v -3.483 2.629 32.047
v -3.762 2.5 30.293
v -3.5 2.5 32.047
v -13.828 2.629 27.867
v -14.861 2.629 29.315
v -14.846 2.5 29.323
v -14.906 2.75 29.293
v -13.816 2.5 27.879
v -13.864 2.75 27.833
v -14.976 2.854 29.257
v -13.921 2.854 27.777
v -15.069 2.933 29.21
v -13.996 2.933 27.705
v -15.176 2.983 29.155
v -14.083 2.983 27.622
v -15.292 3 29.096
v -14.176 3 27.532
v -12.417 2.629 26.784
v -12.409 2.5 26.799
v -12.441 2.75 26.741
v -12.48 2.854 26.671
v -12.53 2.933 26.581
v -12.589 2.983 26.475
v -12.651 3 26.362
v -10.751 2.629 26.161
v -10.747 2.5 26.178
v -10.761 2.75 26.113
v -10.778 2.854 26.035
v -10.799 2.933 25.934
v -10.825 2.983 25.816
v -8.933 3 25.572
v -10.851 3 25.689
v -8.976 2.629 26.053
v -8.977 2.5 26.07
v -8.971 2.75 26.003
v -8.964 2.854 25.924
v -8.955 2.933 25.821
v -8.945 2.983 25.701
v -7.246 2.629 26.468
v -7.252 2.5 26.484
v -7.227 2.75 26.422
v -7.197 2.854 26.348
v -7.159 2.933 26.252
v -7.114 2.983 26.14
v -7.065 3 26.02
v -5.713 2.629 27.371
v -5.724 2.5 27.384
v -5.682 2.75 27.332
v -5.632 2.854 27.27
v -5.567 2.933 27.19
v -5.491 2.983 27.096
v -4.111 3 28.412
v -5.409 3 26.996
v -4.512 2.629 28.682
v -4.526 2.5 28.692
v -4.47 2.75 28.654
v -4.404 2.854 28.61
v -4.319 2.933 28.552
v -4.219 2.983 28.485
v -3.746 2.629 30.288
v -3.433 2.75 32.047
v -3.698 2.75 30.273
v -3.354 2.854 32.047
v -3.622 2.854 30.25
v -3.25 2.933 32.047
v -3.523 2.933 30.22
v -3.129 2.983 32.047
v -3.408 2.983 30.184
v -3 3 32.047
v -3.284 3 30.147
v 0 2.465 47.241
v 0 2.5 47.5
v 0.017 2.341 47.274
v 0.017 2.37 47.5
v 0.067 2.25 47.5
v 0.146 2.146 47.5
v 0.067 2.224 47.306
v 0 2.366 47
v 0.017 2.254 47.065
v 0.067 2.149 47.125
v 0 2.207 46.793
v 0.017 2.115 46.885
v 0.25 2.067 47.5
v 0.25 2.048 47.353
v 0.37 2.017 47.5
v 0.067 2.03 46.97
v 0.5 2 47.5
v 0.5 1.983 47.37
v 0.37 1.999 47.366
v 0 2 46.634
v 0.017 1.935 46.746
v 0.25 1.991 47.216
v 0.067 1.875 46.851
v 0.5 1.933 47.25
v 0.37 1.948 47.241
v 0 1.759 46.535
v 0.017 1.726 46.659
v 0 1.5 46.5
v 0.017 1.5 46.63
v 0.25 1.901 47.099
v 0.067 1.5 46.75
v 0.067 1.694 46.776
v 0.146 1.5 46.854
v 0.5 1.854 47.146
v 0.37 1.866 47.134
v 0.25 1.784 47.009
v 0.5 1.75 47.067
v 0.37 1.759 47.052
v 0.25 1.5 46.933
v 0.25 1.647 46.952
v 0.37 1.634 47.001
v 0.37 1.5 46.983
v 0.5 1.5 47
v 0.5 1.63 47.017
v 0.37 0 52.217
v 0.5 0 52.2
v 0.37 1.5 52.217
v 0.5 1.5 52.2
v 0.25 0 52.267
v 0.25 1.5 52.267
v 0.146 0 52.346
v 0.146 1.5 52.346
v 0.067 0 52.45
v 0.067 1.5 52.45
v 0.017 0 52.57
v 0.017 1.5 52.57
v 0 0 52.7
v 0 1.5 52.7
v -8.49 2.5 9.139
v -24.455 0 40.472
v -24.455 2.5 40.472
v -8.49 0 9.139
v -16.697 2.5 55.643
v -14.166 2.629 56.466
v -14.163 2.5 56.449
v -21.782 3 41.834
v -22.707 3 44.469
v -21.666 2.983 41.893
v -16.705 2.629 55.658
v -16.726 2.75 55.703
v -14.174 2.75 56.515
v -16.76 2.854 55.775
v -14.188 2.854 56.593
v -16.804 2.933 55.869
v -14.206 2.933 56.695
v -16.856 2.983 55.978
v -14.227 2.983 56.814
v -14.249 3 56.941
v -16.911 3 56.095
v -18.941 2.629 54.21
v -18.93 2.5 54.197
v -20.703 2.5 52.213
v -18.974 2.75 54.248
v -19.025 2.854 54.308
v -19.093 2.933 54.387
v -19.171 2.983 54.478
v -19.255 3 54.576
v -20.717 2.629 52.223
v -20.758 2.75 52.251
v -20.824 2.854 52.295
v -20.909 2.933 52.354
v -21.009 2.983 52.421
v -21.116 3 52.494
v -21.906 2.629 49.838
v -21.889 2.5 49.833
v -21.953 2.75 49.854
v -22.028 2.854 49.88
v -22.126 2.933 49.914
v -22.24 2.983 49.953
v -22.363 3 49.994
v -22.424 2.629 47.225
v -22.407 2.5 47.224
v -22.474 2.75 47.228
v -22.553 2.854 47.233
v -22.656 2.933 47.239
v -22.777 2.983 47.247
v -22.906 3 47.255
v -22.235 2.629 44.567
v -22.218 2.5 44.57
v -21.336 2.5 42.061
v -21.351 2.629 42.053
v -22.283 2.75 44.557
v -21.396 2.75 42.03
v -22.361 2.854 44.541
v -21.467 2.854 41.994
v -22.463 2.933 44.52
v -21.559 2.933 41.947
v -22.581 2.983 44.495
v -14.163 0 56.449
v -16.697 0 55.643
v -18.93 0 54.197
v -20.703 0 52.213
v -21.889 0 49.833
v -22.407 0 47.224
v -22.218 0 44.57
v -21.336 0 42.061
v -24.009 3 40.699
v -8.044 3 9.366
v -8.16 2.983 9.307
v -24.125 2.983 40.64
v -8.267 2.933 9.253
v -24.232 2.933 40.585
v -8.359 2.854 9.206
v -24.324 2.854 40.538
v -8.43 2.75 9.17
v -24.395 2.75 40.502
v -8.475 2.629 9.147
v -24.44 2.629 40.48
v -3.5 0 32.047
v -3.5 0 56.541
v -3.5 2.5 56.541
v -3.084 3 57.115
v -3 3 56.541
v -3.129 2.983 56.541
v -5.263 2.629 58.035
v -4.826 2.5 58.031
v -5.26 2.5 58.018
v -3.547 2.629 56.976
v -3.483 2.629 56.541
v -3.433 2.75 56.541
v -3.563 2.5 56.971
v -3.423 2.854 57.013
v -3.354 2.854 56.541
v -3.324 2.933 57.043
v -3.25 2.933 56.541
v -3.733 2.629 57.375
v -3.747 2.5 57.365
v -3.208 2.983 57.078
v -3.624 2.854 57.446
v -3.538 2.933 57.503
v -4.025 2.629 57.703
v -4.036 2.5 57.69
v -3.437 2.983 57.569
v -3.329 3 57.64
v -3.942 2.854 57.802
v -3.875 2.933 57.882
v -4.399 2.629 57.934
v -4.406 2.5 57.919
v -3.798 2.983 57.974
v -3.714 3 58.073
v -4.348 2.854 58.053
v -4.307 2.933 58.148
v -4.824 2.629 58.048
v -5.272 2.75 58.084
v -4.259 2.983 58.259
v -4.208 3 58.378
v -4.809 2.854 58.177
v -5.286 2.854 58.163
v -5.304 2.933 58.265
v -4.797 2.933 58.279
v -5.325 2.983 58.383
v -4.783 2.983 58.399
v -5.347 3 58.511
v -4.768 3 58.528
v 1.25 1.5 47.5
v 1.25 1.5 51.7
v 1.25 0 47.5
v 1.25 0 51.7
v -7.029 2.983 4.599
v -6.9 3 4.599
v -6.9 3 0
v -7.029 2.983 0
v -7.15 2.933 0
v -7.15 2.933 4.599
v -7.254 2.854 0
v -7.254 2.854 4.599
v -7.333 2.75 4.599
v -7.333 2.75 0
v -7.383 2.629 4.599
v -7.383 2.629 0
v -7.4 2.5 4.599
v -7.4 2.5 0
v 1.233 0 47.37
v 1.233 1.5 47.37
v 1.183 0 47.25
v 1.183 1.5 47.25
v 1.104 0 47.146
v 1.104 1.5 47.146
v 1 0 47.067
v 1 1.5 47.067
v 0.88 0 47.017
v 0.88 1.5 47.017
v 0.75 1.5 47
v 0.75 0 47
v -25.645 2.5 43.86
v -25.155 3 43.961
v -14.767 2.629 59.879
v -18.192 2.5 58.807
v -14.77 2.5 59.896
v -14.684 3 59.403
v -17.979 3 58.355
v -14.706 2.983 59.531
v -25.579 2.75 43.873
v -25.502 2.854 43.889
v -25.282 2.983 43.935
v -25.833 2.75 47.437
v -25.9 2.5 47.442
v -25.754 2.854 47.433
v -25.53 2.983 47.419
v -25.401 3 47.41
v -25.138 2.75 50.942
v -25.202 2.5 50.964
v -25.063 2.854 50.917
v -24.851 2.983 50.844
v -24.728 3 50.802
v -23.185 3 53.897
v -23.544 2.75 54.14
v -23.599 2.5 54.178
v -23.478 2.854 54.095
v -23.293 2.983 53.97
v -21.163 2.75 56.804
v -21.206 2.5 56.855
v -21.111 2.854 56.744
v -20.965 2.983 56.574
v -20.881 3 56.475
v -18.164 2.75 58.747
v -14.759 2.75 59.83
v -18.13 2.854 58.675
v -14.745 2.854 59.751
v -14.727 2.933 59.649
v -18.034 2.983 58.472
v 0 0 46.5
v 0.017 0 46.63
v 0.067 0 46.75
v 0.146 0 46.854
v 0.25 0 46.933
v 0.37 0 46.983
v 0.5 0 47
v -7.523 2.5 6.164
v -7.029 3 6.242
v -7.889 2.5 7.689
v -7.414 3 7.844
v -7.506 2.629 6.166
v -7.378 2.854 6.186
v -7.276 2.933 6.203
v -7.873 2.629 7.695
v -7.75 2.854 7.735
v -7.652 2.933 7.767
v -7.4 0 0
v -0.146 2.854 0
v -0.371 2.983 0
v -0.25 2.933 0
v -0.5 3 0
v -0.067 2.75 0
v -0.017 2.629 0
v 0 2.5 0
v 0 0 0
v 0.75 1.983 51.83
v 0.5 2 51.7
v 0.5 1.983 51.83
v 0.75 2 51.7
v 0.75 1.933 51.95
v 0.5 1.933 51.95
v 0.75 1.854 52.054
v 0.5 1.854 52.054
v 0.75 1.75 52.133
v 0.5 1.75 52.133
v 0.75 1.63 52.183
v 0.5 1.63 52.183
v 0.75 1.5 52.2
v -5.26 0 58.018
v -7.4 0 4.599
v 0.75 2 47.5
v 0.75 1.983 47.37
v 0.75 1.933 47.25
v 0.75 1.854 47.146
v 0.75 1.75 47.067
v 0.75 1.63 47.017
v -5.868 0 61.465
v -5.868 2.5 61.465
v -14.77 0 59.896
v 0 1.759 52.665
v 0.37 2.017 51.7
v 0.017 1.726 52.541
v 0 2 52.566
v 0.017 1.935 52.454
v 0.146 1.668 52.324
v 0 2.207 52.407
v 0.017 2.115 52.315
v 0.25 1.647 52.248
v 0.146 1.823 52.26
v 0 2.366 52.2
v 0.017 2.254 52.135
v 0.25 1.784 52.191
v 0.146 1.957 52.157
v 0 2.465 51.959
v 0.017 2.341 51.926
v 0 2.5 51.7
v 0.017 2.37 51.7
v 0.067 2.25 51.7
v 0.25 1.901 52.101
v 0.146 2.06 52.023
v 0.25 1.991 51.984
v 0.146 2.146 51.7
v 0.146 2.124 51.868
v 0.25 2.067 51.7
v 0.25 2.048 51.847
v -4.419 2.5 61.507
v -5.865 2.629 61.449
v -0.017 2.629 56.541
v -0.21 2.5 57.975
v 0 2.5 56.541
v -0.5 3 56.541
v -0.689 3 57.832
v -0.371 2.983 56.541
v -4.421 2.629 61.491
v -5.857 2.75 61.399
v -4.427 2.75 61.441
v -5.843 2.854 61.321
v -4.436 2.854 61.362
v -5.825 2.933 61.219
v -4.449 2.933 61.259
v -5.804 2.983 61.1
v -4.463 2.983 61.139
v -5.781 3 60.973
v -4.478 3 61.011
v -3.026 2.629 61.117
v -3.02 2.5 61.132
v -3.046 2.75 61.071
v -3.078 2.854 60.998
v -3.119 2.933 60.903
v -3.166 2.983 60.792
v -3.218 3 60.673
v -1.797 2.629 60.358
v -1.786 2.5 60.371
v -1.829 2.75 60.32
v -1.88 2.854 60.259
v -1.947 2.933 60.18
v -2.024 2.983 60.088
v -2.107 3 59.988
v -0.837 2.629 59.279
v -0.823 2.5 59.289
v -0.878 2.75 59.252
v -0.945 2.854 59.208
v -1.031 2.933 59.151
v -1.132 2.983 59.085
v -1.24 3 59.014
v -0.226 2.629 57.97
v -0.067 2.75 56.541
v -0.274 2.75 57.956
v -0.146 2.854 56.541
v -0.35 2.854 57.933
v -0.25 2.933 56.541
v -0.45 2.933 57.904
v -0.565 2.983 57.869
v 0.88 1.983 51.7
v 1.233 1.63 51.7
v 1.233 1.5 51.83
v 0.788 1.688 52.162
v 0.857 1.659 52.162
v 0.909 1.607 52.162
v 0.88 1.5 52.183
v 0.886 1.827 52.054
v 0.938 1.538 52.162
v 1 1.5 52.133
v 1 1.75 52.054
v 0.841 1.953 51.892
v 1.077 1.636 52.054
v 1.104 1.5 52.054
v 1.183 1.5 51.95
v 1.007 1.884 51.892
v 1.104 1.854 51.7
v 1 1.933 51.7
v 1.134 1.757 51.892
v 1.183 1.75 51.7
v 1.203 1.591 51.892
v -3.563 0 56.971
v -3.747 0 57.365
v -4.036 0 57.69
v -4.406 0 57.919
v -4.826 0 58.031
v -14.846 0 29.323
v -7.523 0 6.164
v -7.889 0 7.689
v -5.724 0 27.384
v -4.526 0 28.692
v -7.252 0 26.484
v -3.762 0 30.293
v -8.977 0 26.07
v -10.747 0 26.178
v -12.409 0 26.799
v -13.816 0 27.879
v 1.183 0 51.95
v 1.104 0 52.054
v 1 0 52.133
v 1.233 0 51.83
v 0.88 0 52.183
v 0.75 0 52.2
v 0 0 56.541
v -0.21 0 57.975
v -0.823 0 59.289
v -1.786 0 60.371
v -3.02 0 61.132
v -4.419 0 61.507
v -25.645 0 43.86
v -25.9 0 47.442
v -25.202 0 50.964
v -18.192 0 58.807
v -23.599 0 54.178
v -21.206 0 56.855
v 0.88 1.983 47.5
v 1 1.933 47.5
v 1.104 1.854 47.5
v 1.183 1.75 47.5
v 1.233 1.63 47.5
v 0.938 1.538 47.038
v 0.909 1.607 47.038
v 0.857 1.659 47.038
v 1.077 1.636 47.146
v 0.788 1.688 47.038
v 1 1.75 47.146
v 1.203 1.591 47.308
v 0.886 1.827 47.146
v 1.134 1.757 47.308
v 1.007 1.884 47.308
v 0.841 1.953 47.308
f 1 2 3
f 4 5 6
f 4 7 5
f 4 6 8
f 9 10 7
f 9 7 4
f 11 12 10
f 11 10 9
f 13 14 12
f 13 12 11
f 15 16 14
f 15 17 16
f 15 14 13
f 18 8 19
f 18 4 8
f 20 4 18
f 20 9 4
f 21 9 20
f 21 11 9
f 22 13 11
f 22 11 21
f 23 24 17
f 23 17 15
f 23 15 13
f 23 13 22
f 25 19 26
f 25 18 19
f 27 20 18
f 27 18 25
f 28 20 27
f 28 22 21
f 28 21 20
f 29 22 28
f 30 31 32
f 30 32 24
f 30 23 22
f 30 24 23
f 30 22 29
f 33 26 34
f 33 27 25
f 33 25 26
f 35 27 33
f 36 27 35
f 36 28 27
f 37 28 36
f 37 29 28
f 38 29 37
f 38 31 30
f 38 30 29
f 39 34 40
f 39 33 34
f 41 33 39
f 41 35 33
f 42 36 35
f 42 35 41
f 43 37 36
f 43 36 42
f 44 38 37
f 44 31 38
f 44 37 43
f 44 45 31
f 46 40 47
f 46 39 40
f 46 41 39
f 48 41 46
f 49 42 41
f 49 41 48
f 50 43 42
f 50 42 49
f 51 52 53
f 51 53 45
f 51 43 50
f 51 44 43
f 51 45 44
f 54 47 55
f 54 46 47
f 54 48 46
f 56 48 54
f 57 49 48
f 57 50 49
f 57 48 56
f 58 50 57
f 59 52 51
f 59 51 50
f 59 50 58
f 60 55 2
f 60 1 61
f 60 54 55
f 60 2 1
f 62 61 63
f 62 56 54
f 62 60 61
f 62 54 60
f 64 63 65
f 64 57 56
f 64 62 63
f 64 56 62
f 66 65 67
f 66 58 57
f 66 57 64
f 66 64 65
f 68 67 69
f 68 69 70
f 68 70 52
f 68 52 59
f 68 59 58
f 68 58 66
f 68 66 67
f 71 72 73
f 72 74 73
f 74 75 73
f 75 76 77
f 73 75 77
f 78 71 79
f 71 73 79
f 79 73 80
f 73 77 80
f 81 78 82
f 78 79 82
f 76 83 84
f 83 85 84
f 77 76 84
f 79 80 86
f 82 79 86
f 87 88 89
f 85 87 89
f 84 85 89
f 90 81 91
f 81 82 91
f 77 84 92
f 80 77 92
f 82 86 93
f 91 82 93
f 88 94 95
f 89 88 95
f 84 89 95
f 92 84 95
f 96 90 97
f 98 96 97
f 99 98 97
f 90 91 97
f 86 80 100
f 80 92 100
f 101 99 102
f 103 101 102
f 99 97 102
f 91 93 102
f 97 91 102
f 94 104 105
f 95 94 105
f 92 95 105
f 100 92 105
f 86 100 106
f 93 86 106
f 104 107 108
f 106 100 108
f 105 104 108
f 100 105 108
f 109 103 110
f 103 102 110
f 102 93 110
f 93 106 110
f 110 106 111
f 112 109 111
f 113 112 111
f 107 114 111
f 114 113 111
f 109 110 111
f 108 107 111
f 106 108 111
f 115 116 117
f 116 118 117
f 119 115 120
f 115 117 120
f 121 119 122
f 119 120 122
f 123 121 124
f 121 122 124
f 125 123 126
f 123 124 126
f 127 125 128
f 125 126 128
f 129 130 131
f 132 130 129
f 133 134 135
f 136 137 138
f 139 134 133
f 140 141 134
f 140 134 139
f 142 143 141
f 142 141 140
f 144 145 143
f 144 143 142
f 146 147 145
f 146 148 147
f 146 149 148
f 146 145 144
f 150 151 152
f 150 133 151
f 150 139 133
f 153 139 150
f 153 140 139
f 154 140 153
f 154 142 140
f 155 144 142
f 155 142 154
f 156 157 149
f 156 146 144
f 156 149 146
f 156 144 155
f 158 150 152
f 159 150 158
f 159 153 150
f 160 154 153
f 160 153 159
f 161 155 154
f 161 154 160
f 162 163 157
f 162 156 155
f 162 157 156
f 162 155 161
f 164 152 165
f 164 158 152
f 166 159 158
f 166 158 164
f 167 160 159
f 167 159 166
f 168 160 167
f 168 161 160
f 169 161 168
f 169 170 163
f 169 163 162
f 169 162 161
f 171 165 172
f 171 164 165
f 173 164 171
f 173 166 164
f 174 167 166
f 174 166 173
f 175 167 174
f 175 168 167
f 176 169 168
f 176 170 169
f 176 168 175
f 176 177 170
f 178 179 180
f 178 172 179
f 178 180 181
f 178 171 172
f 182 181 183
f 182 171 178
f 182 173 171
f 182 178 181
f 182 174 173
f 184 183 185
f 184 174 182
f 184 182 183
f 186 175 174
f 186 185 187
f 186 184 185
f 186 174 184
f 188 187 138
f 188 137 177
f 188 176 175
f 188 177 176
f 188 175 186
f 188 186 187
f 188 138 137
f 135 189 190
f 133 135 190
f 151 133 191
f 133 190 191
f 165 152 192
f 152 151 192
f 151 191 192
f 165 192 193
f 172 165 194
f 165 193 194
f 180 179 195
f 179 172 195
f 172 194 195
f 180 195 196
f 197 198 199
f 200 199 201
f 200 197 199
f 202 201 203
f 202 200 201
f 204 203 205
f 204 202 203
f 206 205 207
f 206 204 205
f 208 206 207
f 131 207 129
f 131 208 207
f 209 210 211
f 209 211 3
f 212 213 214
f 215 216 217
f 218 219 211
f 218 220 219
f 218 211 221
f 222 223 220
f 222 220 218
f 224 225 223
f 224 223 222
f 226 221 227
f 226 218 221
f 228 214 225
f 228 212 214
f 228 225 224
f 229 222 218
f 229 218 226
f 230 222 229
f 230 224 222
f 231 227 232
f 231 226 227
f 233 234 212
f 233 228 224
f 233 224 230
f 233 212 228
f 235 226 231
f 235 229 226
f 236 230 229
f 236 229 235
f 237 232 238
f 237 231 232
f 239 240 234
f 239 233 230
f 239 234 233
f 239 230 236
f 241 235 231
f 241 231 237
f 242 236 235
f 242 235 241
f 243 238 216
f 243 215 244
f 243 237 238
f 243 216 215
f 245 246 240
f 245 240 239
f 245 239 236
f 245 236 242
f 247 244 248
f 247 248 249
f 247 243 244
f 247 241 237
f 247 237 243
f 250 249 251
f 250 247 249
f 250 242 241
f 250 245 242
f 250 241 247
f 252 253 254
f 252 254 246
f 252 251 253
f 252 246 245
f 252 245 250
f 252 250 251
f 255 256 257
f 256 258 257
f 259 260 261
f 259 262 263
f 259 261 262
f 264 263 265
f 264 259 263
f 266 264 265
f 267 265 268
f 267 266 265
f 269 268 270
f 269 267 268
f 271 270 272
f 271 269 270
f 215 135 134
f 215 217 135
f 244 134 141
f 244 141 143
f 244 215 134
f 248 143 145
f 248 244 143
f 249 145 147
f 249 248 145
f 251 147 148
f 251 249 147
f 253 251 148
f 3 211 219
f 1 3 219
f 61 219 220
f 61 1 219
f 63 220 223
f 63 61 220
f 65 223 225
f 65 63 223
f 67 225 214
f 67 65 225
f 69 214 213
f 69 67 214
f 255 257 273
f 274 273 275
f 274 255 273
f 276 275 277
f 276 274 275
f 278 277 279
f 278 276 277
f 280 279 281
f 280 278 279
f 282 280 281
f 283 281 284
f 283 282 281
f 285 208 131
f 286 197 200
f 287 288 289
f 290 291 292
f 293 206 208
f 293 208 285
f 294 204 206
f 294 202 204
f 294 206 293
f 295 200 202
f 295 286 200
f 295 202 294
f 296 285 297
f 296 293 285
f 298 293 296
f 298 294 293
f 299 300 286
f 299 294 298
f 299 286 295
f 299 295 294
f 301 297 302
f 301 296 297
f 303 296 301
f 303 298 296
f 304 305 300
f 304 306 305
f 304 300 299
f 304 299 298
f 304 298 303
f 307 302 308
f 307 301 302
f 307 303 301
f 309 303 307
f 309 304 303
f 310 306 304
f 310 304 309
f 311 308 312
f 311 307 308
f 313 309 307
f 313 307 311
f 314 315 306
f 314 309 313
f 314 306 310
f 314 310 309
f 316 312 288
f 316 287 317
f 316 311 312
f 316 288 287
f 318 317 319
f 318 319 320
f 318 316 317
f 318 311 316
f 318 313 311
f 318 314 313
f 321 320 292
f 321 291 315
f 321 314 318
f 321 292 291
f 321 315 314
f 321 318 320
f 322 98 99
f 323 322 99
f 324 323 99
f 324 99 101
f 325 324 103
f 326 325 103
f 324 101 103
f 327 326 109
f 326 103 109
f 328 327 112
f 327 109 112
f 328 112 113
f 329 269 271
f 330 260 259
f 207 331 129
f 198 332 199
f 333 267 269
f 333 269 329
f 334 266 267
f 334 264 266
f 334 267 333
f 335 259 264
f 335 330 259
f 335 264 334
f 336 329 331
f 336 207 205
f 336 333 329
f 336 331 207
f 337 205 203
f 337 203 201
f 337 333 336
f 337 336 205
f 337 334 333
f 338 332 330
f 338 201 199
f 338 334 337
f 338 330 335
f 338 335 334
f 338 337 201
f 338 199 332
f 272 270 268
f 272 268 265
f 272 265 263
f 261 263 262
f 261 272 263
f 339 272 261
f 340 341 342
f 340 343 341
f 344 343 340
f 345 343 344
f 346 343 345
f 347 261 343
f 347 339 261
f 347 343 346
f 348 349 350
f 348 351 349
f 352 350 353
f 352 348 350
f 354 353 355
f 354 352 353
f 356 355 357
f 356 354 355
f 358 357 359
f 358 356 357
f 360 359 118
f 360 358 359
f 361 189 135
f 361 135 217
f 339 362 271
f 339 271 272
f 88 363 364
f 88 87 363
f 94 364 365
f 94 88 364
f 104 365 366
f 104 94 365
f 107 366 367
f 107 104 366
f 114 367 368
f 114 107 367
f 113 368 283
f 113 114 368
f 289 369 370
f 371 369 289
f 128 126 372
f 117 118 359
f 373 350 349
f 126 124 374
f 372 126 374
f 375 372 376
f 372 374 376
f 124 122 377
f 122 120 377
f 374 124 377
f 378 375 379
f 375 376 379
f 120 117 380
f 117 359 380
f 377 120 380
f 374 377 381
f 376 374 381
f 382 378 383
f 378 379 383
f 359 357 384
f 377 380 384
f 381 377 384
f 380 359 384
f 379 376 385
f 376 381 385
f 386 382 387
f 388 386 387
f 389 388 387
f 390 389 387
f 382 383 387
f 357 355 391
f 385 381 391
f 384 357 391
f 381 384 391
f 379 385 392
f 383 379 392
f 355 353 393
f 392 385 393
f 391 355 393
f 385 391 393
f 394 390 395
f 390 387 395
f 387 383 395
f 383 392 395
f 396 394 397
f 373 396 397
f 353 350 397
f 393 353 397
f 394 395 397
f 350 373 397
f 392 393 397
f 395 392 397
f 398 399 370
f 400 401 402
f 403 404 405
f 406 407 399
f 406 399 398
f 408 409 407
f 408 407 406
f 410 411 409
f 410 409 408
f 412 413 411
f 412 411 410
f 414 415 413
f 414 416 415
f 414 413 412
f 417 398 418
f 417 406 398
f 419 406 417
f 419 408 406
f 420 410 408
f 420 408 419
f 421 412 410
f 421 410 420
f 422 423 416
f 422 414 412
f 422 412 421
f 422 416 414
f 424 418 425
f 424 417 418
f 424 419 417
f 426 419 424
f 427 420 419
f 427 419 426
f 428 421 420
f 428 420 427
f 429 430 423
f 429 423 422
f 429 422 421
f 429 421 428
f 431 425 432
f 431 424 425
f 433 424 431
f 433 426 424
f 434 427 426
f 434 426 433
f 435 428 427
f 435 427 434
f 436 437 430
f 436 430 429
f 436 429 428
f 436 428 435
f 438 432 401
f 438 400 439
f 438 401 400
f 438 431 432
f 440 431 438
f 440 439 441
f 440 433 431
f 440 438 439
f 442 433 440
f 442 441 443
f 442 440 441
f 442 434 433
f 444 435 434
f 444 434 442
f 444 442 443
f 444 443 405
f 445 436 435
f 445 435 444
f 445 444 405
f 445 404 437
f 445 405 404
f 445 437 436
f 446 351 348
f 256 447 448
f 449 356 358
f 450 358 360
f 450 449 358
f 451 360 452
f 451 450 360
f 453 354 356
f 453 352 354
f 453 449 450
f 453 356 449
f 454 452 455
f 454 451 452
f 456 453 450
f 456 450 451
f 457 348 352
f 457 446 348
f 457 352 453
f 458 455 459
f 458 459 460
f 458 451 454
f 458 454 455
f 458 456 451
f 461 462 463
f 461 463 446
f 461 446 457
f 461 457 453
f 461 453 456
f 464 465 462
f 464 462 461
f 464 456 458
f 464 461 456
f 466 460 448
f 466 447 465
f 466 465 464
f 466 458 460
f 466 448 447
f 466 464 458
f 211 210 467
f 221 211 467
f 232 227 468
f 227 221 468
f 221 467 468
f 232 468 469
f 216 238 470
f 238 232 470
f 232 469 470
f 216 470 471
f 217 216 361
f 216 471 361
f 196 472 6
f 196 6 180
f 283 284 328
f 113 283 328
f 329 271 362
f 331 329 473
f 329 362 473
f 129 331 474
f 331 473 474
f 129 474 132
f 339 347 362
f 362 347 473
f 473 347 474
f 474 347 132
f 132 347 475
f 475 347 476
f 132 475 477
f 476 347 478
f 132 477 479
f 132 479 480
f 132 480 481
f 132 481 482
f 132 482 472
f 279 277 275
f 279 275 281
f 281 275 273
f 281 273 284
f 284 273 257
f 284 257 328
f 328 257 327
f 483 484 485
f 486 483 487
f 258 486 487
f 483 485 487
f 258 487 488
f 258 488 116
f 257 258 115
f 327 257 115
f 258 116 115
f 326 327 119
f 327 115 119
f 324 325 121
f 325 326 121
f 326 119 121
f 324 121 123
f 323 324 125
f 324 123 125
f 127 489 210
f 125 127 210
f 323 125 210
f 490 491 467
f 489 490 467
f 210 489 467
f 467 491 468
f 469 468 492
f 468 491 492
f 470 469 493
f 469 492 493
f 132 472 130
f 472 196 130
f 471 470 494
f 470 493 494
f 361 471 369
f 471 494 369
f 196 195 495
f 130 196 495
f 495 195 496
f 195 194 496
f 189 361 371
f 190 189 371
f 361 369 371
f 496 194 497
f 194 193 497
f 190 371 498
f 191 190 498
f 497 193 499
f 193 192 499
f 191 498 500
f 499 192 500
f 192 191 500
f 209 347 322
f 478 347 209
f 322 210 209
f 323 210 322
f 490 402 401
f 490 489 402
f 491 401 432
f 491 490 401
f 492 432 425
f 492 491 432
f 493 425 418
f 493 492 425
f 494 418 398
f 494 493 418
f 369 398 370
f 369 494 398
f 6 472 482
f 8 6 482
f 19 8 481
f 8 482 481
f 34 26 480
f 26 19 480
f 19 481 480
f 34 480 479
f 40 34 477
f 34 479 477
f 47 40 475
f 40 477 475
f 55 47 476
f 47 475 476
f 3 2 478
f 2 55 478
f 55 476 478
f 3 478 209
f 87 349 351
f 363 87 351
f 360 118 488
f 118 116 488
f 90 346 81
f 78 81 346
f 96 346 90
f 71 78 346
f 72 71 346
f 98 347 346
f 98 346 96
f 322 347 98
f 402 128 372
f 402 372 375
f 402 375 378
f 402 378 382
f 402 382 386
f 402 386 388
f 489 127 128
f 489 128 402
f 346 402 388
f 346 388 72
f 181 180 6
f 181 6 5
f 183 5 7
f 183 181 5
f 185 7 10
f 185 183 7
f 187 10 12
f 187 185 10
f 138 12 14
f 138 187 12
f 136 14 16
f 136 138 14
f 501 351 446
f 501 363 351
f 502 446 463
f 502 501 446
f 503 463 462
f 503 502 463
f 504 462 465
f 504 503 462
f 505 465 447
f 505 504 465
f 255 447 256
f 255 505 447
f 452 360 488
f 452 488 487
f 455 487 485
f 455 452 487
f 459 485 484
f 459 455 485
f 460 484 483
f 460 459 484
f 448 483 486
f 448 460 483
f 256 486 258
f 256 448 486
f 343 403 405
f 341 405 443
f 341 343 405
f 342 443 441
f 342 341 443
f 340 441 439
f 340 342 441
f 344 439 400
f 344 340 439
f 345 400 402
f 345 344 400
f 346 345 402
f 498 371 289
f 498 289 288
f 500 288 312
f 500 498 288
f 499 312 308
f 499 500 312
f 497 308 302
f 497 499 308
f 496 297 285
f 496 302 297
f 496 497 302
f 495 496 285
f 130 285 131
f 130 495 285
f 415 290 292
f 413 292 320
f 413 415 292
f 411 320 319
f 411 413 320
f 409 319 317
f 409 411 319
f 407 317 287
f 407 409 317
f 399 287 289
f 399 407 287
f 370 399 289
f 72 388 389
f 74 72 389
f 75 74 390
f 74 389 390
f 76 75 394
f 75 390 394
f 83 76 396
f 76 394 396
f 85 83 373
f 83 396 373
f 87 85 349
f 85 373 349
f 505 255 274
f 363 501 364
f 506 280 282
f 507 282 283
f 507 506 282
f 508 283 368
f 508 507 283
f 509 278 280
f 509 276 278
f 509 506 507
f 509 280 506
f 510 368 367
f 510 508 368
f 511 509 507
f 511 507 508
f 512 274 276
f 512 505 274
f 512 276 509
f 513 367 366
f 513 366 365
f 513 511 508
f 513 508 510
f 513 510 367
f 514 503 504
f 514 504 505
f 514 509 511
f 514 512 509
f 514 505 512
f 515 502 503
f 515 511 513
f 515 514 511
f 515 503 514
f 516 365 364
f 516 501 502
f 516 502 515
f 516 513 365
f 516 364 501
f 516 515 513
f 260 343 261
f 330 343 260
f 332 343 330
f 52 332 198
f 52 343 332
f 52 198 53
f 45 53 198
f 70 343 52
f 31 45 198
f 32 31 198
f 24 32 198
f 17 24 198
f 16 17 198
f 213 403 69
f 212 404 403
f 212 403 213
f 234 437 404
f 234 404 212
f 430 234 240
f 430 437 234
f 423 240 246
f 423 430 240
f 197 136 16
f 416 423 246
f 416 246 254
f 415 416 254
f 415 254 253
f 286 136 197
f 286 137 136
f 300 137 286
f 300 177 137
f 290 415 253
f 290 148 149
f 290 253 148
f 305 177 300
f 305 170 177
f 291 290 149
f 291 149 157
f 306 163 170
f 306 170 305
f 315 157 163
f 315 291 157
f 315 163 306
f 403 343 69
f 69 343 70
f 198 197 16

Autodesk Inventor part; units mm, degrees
ref_plane "YZ Plane" through (0, 0, 0) normal (1, 0, 0) x (0, 1, 0)
ref_plane "XZ Plane" through (0, 0, 0) normal (0, 1, 0) x (-1, 0, 0)
ref_plane "XY Plane" through (0, 0, 0) normal (0, 0, 1) x (1, 0, 0)
sketch "Sketch1" plane through (0, 0, 0) normal (0, 1, 0) x (-1, 0, 0)
  line L0 (0, 0) -> (0, 56.5412)
  line L1 (5.8682, 61.4653) -> (14.7704, 59.8956)
  line L2 (24.4547, 40.4718) -> (8.4899, 9.1391)
  line L3 (7.4, 4.5992) -> (7.4, 0)
  line L4 (7.4, 0) -> (0, 0)
  line L5 (3.5, 56.5412) -> (3.5, 32.047)
  line L6 (14.846, 29.3231) -> (21.3362, 42.0608)
  line L7 (14.1626, 56.4488) -> (5.2605, 58.0184)
  arc A0 (3.5, 32.047) -> (14.846, 29.3231) centre (9.5, 32.047) ccw
  arc A1 (5.2605, 58.0184) -> (3.5, 56.5412) centre (5, 56.5412) ccw
  arc A2 (5.8682, 61.4653) -> (0, 56.5412) centre (5, 56.5412) ccw
  arc A3 (21.3362, 42.0608) -> (14.1626, 56.4488) centre (12.4261, 46.6007) ccw
  arc A4 (24.4547, 40.4718) -> (14.7704, 59.8956) centre (12.4261, 46.6007) ccw
  arc A5 (8.4899, 9.1391) -> (7.4, 4.5992) centre (17.4, 4.5992) ccw
  point P0 (0, 62.5)
  point P1 (7.4, 7)
  dimension "d0" = 7.4
  dimension "d5" = 27
  dimension "d6" = 80
  dimension "d7" = 7
  dimension "d8" = 6
  dimension "d9" = 1.5
  dimension "d10" = 62.5
  dimension "d12" = 3.5
  dimension "d13" = 10
  dimension "d15" = 10
extrude "Extrusion1" add sketch "Sketch1" along normal blind 3
fillet "Fillet1" radius 0.5 13 edges at (-3.5, 3, 44.2941) (-4.0358, 3, 57.6903) (-9.7116, 3, 57.2336) (-21.3755, 3, 51.0627) (-18.0911, 3, 35.6919) (-8.0993, 3, 26.2128) (-1.7861, 3, 60.3715) (-10.3193, 3, 60.6804) (-24.5078, 3, 52.6243) (-16.4723, 3, 24.8055) (-7.6763, 3, 6.9337) (-7.4, 3, 2.2996) (0, 3, 28.2706)
sketch "Sketch2" plane through (0, 0, 0) normal (0, -1, 0) x (1, 0, 0)
  line L0 (0, 0) -> (0, 56.5412) projected
  line L1 (-7.4, 0) -> (0, 0) projected
  line L2 (0, 52.2) -> (1.25, 52.2)
  line L3 (1.25, 52.2) -> (1.25, 47)
  line L4 (1.25, 47) -> (0, 47)
  dimension "d19" = 1.25
  dimension "d20" = 5.2
  dimension "d21" = 47
extrude "Extrusion2" add sketch "Sketch2" against normal blind 2
fillet "Fillet2" radius 0.5 8 edges at (1.25, 2, 49.6) (1.25, 1, 52.2) (0.625, 2, 52.2) (0.625, 2, 47) (1.25, 1, 47) (0, 1, 52.2) (0, 2, 49.6) (0, 1, 47)
properties part number "Agarre tijeras (mitad 1)"
